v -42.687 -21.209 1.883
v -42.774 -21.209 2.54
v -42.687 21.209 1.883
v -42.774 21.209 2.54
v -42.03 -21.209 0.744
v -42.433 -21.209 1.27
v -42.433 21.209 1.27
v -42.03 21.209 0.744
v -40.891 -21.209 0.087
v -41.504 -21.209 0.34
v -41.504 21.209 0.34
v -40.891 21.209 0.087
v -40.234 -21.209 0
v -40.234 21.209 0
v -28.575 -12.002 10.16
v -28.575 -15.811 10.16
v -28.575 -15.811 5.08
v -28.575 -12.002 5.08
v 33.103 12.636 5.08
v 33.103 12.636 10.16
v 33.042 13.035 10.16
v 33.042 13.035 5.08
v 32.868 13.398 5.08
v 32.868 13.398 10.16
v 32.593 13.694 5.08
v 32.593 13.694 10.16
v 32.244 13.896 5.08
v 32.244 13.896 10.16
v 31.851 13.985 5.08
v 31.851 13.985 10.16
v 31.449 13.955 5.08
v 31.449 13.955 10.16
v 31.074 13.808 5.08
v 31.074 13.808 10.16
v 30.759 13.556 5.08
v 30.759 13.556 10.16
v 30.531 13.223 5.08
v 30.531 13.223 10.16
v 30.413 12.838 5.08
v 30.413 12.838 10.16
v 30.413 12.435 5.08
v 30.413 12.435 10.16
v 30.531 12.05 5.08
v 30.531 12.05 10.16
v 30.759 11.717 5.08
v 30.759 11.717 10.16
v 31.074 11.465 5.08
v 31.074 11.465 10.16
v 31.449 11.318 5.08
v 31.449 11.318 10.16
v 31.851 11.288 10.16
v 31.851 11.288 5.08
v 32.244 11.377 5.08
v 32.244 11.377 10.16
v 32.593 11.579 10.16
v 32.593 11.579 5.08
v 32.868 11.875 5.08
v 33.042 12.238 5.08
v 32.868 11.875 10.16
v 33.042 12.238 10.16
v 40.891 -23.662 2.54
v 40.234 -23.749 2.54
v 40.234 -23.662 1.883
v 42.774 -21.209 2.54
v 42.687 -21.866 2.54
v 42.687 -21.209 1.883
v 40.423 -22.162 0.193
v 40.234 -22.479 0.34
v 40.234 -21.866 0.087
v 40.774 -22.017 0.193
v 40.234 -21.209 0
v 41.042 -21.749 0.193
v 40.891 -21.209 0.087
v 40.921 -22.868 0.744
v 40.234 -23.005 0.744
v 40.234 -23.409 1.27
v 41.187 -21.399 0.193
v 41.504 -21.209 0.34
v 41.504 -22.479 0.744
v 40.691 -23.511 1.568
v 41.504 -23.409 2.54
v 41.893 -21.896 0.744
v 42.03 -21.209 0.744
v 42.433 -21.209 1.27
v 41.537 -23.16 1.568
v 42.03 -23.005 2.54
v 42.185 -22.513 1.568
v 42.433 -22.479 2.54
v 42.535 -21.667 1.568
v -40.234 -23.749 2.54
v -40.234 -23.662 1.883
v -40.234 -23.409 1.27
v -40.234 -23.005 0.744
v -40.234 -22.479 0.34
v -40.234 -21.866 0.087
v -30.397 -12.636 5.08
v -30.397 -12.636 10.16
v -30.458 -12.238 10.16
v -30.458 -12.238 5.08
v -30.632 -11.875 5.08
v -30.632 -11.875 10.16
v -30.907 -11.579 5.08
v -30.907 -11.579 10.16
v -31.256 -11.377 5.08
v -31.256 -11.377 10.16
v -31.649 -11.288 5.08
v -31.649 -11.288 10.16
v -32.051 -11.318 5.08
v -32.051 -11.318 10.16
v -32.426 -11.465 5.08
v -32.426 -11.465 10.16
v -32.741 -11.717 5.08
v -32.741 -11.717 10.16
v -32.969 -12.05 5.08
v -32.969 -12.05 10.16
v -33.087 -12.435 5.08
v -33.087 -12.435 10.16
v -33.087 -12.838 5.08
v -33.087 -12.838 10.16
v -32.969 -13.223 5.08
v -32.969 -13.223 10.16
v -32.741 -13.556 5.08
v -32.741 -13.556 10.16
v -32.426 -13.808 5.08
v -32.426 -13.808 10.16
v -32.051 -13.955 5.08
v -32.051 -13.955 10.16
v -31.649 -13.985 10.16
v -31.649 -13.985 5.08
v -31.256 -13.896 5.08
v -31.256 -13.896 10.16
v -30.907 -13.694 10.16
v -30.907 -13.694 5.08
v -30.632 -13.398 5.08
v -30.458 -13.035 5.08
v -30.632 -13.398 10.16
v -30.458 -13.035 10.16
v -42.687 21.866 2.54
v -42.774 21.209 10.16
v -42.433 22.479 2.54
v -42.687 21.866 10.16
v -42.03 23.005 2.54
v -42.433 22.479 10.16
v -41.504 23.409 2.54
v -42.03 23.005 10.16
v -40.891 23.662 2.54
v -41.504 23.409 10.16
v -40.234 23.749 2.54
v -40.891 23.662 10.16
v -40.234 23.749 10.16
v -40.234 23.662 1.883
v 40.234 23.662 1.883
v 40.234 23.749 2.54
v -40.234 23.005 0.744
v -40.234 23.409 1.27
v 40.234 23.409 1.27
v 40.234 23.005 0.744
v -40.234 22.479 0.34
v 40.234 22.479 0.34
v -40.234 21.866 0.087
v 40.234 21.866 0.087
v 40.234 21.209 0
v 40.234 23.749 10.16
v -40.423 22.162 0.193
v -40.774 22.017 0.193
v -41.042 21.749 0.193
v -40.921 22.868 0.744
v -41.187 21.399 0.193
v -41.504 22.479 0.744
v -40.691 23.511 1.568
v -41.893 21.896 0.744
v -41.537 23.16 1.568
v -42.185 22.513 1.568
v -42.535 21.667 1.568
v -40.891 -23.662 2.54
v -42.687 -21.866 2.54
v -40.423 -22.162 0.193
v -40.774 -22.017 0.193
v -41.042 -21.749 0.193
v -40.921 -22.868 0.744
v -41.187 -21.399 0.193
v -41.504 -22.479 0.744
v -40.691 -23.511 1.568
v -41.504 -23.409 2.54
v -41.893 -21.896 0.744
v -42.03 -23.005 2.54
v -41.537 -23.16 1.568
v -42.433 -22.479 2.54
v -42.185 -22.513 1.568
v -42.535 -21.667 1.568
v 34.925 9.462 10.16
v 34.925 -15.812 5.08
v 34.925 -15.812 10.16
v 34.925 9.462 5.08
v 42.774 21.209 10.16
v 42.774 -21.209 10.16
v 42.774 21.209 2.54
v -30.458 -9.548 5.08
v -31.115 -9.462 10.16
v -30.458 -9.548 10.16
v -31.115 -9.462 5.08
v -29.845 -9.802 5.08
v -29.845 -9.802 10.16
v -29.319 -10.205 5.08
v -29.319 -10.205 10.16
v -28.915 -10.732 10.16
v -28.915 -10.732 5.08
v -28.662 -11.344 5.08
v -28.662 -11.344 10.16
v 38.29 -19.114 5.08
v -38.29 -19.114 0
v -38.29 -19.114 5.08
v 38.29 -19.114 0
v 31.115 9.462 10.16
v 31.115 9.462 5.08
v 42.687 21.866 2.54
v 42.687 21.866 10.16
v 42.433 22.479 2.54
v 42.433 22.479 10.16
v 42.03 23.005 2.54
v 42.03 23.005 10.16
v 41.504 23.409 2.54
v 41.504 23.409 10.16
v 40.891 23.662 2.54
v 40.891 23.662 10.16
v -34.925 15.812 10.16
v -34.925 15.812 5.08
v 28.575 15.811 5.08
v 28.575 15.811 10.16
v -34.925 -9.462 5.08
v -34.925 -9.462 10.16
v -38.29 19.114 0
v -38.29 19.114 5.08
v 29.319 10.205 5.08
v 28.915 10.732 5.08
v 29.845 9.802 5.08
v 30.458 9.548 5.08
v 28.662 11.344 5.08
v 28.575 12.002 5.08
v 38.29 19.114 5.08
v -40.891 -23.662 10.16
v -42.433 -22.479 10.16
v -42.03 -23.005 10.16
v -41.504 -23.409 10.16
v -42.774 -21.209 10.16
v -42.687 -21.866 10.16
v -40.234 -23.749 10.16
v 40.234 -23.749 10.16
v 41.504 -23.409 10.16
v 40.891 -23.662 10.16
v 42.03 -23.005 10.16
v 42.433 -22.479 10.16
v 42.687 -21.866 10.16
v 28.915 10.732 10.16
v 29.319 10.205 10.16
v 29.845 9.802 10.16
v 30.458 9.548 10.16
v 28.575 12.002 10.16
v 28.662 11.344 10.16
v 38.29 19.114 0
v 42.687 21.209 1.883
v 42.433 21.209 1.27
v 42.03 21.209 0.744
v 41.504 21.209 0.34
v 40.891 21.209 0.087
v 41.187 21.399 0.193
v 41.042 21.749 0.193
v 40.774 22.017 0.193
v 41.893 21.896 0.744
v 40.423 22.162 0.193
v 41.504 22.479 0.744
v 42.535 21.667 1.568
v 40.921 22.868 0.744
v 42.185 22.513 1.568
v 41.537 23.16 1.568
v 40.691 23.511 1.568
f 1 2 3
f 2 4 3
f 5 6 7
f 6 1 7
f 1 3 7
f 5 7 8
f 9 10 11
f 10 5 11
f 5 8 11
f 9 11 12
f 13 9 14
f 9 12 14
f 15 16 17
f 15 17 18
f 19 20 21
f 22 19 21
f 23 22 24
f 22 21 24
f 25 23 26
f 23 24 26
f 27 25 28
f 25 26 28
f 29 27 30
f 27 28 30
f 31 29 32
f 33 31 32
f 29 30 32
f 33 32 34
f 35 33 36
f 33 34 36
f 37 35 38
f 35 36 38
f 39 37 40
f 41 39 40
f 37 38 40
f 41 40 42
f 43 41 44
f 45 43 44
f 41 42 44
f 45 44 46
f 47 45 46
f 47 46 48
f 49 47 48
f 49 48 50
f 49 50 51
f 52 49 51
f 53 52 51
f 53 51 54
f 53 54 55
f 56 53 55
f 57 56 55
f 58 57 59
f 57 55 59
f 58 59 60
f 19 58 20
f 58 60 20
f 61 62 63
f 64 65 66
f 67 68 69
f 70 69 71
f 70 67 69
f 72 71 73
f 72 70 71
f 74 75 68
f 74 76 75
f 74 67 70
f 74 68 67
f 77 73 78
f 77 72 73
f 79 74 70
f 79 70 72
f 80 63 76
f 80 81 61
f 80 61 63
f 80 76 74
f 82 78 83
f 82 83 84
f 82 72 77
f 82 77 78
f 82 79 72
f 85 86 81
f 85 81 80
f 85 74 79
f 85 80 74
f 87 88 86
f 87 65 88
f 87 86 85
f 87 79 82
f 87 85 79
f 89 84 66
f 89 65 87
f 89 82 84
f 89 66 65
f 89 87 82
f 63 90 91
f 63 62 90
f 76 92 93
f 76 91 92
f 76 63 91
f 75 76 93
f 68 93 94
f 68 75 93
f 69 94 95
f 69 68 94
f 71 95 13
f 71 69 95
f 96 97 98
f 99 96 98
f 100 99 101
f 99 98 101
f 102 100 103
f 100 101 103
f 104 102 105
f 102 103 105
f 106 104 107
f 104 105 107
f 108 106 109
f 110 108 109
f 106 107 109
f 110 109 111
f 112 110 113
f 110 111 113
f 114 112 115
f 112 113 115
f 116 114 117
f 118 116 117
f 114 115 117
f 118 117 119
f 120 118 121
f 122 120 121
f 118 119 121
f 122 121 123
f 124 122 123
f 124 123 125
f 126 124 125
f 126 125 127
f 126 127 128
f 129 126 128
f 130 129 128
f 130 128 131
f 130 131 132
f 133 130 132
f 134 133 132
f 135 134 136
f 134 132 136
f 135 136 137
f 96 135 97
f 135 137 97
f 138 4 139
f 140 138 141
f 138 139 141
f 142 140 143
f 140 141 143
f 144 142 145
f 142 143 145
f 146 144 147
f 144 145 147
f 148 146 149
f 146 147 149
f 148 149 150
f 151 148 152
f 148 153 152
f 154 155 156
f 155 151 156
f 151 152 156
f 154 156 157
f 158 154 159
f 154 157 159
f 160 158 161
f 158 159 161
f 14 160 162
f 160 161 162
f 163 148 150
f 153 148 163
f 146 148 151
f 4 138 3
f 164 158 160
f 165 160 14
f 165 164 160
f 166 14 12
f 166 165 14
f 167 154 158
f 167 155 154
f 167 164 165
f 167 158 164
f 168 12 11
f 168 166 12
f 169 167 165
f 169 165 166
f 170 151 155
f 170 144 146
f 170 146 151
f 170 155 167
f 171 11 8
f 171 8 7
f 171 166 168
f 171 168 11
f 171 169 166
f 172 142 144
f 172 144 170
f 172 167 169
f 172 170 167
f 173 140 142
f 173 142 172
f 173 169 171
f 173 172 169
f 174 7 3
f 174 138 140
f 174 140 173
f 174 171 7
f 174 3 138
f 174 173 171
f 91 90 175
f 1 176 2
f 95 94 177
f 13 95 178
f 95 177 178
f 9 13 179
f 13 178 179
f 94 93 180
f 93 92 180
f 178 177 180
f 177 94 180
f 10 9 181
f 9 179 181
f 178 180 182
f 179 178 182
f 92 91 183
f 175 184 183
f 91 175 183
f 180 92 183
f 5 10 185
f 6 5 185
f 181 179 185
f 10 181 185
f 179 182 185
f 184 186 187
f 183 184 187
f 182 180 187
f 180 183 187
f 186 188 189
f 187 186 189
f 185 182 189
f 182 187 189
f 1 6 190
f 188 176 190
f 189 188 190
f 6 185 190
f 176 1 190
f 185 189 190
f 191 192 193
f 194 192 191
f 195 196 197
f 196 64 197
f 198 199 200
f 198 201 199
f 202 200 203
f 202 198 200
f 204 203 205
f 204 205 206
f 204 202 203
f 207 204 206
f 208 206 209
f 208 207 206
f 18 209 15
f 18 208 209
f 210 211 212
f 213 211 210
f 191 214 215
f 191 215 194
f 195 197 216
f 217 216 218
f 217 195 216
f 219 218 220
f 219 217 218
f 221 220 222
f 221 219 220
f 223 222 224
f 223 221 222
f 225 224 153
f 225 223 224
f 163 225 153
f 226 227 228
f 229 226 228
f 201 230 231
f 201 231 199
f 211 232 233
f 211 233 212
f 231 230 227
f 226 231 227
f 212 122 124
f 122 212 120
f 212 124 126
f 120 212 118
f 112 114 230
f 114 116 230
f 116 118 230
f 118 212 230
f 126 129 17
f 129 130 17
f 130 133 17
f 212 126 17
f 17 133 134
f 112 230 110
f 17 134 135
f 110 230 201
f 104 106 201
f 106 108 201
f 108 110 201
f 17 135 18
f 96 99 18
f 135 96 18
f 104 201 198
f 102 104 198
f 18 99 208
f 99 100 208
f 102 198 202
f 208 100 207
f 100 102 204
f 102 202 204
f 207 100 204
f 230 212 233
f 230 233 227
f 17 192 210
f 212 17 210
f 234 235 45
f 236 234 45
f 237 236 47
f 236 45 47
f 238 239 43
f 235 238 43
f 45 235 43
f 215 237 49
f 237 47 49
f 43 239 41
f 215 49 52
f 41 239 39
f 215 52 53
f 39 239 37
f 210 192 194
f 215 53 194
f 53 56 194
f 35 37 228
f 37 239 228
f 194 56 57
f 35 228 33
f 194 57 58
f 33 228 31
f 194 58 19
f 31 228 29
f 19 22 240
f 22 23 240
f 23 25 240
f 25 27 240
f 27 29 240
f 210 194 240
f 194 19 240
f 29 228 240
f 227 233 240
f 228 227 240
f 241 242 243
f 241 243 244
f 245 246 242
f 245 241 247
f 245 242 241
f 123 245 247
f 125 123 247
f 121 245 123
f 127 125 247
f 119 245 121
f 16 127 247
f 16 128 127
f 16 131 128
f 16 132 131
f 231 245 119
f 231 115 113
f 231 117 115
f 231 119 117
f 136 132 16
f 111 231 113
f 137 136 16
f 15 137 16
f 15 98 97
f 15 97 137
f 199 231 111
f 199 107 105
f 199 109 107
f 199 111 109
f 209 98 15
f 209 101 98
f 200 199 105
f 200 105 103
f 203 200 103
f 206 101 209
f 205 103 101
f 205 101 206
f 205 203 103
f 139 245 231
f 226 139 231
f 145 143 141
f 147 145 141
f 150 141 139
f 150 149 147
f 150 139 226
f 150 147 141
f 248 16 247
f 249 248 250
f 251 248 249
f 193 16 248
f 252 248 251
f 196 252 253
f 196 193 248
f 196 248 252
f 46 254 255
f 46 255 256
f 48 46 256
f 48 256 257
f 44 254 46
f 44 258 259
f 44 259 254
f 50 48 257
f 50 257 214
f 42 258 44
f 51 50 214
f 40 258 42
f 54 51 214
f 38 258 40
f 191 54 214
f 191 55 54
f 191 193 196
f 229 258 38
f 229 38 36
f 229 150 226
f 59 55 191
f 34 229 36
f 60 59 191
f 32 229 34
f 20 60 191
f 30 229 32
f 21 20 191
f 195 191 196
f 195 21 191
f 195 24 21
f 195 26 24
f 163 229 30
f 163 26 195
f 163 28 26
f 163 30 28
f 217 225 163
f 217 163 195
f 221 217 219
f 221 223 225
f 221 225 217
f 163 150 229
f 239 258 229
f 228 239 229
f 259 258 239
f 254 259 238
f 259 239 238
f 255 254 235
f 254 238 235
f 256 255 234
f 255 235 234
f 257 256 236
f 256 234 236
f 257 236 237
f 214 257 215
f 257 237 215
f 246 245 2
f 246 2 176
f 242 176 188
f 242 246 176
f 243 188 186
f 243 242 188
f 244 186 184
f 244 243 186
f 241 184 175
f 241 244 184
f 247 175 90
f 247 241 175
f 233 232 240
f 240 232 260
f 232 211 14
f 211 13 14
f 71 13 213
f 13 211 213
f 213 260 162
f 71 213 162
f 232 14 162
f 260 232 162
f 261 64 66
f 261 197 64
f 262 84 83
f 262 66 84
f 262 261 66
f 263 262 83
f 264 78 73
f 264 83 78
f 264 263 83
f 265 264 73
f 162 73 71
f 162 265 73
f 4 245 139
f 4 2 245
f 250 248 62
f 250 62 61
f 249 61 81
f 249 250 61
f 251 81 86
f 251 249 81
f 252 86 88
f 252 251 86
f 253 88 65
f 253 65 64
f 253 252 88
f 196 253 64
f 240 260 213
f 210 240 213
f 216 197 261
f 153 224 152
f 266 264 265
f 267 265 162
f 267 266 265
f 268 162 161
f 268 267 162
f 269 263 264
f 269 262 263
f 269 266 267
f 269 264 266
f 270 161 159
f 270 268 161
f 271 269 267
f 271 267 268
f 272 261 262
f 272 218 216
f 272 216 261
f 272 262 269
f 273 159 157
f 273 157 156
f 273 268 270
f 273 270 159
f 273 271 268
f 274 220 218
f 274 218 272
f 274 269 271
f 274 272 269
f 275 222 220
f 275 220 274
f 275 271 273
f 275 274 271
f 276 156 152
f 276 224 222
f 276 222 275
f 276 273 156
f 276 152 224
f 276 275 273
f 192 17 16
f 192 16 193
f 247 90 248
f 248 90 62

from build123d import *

# Parameters (mm, degrees)
F0_W     = 85.5472
F0_H     = 47.498
F0_W_2   = 69.85
F0_H_2   = 31.623
F1_DEPTH = 10.16
F2_W     = 6.35
F2_H     = 6.35
F2_R     = 1.35255
F3_DEPTH = 5.08
F4_R     = 2.54
F5_W     = 76.581
F5_H     = 38.227
F5_W_2   = 69.85
F5_H_2   = 31.623
F6_DEPTH = 5.08
F7_R     = 2.54


with BuildPart() as f1:
    # F0 (on Top) → F1 (new body)
    with BuildSketch(Plane.XY):
        Rectangle(F0_W, F0_H)
        Rectangle(F0_W_2, F0_H_2, mode=Mode.SUBTRACT)
    extrude(amount=F1_DEPTH)

    # F2 (on face) → F3 (join)
    with BuildSketch(Plane.XY.offset(10.16)):
        with Locations((-31.75, -12.6365)):
            Rectangle(F2_W, F2_H)
        with Locations((-31.75, -12.6365)):
            Circle(F2_R, mode=Mode.SUBTRACT)
        with Locations((31.75, 12.6365)):
            Rectangle(F2_W, F2_H)
        with Locations((31.75, 12.6365)):
            Circle(F2_R, mode=Mode.SUBTRACT)
    extrude(amount=-F3_DEPTH)

    # F4
    f4_edges = [f1.edges().sort_by_distance(p)[0] for p in [
        (28.575, 9.4615, 7.62),
        (-28.575, -9.4615, 7.62),
    ]]
    fillet(f4_edges, radius=F4_R)

    # F5 (on face) → F6 (cut)
    with BuildSketch(Plane(origin=(0, 0, 0), x_dir=(1, 0, 0), z_dir=(0, 0, -1))):
        Rectangle(F5_W, F5_H)
        Rectangle(F5_W_2, F5_H_2, mode=Mode.SUBTRACT)
    extrude(amount=-F6_DEPTH, mode=Mode.SUBTRACT)

    # F7
    f7_edges = [f1.edges().sort_by_distance(p)[0] for p in [
        (42.7736, -23.749, 5.08),
        (42.7736, 23.749, 5.08),
        (-42.7736, -23.749, 5.08),
        (-42.7736, 23.749, 5.08),
        (0, -23.749, 0),
        (42.7736, 0, 0),
        (0, 23.749, 0),
        (-42.7736, 0, 0),
    ]]
    fillet(f7_edges, radius=F7_R)


solid = f1.part
